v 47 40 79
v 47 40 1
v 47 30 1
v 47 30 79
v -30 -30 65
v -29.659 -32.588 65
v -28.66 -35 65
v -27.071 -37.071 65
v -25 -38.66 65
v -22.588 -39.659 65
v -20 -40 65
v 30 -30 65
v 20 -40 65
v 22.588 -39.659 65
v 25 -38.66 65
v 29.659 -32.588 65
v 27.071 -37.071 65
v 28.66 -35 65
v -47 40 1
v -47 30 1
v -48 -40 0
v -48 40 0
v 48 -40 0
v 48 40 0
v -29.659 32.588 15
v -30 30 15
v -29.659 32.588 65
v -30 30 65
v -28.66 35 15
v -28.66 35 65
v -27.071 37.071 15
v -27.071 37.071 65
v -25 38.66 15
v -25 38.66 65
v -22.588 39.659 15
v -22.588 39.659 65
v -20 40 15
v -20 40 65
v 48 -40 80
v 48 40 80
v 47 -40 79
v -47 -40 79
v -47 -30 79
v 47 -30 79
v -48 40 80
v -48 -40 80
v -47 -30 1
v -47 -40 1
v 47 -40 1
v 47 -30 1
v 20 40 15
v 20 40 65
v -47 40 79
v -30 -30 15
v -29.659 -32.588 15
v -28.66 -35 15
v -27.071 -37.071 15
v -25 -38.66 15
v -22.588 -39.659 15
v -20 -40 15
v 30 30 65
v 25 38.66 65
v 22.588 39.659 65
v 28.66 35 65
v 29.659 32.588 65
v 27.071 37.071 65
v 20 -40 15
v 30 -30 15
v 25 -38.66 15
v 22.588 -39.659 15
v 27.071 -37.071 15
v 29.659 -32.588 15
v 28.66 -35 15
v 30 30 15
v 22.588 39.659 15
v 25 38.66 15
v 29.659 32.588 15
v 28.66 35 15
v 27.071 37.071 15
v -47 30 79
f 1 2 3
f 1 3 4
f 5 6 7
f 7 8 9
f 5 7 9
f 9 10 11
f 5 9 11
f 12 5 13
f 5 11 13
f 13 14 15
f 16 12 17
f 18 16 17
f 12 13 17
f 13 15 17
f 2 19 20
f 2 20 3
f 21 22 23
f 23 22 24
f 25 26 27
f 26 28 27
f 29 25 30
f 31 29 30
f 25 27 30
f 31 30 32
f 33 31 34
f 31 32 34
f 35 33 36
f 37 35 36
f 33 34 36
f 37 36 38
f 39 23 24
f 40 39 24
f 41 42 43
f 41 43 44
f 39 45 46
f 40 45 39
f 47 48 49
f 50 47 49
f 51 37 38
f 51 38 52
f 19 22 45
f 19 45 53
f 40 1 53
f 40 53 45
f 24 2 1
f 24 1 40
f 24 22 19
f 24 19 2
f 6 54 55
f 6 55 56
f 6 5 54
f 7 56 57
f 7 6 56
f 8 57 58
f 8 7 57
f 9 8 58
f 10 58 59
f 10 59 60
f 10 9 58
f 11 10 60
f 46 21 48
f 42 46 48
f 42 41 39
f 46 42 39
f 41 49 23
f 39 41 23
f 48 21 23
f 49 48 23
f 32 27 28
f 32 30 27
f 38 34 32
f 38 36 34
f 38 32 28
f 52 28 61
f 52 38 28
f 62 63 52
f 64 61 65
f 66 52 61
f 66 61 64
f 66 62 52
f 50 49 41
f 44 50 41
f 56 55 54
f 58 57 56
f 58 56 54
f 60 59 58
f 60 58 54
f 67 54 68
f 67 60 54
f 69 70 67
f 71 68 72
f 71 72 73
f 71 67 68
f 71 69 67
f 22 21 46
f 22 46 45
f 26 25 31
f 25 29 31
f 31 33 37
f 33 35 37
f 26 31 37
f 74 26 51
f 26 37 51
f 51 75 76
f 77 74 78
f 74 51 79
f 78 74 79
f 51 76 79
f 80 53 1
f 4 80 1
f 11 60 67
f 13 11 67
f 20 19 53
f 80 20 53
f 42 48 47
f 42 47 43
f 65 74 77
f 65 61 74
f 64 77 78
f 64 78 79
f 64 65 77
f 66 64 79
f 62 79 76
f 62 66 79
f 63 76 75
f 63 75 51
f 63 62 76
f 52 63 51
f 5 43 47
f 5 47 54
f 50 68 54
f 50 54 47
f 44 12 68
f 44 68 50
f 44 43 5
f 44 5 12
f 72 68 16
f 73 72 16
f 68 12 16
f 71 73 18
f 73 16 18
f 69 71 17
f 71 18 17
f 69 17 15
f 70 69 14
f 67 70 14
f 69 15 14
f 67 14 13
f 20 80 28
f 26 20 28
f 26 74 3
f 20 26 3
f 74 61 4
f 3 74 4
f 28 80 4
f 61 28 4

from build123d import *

# Parameters (mm, degrees)
F0_W     = 96
F0_H     = 80
F1_DEPTH = 80
F2_W     = 94
F2_H     = 78
F2_W_2   = 60
F2_H_2   = 50
F3_DEPTH = 10
F4_R     = 9.99999


# Not quite as in the source:
# - a fillet or chamfer is up to 0.001 mm smaller than in the source, because OpenCascade refuses the exact size
# - a pattern or mirror of a feature is missing from the dataset's text; its kind, count and spacing are read off the source's solid


with BuildPart() as f1:
    # F0 (on Top) → F1 (new body)
    with BuildSketch(Plane.XY):
        Rectangle(F0_W, F0_H)
    extrude(amount=F1_DEPTH)

    # F2 (on face) → F3 (cut)
    with BuildSketch(Plane.XZ.offset(40)):
        with Locations((0, 40)):
            Rectangle(F2_W, F2_H)
        with Locations((0, 40)):
            Rectangle(F2_W_2, F2_H_2, mode=Mode.SUBTRACT)
    f3 = extrude(amount=-F3_DEPTH, mode=Mode.SUBTRACT)

    # F3_copies: F3 across plane
    add(f3.mirror(Plane.ZX), mode=Mode.SUBTRACT)

    # F4 (radius 10 in the source; OpenCascade refuses exactly that, so slightly less here)
    f4_edges = [f1.edges().sort_by_distance(p)[0] for p in [
        (30, -40, 40),
        (-30, -40, 40),
        (30, 40, 40),
        (-30, 40, 40),
    ]]
    fillet(f4_edges, radius=F4_R)


solid = f1.part
